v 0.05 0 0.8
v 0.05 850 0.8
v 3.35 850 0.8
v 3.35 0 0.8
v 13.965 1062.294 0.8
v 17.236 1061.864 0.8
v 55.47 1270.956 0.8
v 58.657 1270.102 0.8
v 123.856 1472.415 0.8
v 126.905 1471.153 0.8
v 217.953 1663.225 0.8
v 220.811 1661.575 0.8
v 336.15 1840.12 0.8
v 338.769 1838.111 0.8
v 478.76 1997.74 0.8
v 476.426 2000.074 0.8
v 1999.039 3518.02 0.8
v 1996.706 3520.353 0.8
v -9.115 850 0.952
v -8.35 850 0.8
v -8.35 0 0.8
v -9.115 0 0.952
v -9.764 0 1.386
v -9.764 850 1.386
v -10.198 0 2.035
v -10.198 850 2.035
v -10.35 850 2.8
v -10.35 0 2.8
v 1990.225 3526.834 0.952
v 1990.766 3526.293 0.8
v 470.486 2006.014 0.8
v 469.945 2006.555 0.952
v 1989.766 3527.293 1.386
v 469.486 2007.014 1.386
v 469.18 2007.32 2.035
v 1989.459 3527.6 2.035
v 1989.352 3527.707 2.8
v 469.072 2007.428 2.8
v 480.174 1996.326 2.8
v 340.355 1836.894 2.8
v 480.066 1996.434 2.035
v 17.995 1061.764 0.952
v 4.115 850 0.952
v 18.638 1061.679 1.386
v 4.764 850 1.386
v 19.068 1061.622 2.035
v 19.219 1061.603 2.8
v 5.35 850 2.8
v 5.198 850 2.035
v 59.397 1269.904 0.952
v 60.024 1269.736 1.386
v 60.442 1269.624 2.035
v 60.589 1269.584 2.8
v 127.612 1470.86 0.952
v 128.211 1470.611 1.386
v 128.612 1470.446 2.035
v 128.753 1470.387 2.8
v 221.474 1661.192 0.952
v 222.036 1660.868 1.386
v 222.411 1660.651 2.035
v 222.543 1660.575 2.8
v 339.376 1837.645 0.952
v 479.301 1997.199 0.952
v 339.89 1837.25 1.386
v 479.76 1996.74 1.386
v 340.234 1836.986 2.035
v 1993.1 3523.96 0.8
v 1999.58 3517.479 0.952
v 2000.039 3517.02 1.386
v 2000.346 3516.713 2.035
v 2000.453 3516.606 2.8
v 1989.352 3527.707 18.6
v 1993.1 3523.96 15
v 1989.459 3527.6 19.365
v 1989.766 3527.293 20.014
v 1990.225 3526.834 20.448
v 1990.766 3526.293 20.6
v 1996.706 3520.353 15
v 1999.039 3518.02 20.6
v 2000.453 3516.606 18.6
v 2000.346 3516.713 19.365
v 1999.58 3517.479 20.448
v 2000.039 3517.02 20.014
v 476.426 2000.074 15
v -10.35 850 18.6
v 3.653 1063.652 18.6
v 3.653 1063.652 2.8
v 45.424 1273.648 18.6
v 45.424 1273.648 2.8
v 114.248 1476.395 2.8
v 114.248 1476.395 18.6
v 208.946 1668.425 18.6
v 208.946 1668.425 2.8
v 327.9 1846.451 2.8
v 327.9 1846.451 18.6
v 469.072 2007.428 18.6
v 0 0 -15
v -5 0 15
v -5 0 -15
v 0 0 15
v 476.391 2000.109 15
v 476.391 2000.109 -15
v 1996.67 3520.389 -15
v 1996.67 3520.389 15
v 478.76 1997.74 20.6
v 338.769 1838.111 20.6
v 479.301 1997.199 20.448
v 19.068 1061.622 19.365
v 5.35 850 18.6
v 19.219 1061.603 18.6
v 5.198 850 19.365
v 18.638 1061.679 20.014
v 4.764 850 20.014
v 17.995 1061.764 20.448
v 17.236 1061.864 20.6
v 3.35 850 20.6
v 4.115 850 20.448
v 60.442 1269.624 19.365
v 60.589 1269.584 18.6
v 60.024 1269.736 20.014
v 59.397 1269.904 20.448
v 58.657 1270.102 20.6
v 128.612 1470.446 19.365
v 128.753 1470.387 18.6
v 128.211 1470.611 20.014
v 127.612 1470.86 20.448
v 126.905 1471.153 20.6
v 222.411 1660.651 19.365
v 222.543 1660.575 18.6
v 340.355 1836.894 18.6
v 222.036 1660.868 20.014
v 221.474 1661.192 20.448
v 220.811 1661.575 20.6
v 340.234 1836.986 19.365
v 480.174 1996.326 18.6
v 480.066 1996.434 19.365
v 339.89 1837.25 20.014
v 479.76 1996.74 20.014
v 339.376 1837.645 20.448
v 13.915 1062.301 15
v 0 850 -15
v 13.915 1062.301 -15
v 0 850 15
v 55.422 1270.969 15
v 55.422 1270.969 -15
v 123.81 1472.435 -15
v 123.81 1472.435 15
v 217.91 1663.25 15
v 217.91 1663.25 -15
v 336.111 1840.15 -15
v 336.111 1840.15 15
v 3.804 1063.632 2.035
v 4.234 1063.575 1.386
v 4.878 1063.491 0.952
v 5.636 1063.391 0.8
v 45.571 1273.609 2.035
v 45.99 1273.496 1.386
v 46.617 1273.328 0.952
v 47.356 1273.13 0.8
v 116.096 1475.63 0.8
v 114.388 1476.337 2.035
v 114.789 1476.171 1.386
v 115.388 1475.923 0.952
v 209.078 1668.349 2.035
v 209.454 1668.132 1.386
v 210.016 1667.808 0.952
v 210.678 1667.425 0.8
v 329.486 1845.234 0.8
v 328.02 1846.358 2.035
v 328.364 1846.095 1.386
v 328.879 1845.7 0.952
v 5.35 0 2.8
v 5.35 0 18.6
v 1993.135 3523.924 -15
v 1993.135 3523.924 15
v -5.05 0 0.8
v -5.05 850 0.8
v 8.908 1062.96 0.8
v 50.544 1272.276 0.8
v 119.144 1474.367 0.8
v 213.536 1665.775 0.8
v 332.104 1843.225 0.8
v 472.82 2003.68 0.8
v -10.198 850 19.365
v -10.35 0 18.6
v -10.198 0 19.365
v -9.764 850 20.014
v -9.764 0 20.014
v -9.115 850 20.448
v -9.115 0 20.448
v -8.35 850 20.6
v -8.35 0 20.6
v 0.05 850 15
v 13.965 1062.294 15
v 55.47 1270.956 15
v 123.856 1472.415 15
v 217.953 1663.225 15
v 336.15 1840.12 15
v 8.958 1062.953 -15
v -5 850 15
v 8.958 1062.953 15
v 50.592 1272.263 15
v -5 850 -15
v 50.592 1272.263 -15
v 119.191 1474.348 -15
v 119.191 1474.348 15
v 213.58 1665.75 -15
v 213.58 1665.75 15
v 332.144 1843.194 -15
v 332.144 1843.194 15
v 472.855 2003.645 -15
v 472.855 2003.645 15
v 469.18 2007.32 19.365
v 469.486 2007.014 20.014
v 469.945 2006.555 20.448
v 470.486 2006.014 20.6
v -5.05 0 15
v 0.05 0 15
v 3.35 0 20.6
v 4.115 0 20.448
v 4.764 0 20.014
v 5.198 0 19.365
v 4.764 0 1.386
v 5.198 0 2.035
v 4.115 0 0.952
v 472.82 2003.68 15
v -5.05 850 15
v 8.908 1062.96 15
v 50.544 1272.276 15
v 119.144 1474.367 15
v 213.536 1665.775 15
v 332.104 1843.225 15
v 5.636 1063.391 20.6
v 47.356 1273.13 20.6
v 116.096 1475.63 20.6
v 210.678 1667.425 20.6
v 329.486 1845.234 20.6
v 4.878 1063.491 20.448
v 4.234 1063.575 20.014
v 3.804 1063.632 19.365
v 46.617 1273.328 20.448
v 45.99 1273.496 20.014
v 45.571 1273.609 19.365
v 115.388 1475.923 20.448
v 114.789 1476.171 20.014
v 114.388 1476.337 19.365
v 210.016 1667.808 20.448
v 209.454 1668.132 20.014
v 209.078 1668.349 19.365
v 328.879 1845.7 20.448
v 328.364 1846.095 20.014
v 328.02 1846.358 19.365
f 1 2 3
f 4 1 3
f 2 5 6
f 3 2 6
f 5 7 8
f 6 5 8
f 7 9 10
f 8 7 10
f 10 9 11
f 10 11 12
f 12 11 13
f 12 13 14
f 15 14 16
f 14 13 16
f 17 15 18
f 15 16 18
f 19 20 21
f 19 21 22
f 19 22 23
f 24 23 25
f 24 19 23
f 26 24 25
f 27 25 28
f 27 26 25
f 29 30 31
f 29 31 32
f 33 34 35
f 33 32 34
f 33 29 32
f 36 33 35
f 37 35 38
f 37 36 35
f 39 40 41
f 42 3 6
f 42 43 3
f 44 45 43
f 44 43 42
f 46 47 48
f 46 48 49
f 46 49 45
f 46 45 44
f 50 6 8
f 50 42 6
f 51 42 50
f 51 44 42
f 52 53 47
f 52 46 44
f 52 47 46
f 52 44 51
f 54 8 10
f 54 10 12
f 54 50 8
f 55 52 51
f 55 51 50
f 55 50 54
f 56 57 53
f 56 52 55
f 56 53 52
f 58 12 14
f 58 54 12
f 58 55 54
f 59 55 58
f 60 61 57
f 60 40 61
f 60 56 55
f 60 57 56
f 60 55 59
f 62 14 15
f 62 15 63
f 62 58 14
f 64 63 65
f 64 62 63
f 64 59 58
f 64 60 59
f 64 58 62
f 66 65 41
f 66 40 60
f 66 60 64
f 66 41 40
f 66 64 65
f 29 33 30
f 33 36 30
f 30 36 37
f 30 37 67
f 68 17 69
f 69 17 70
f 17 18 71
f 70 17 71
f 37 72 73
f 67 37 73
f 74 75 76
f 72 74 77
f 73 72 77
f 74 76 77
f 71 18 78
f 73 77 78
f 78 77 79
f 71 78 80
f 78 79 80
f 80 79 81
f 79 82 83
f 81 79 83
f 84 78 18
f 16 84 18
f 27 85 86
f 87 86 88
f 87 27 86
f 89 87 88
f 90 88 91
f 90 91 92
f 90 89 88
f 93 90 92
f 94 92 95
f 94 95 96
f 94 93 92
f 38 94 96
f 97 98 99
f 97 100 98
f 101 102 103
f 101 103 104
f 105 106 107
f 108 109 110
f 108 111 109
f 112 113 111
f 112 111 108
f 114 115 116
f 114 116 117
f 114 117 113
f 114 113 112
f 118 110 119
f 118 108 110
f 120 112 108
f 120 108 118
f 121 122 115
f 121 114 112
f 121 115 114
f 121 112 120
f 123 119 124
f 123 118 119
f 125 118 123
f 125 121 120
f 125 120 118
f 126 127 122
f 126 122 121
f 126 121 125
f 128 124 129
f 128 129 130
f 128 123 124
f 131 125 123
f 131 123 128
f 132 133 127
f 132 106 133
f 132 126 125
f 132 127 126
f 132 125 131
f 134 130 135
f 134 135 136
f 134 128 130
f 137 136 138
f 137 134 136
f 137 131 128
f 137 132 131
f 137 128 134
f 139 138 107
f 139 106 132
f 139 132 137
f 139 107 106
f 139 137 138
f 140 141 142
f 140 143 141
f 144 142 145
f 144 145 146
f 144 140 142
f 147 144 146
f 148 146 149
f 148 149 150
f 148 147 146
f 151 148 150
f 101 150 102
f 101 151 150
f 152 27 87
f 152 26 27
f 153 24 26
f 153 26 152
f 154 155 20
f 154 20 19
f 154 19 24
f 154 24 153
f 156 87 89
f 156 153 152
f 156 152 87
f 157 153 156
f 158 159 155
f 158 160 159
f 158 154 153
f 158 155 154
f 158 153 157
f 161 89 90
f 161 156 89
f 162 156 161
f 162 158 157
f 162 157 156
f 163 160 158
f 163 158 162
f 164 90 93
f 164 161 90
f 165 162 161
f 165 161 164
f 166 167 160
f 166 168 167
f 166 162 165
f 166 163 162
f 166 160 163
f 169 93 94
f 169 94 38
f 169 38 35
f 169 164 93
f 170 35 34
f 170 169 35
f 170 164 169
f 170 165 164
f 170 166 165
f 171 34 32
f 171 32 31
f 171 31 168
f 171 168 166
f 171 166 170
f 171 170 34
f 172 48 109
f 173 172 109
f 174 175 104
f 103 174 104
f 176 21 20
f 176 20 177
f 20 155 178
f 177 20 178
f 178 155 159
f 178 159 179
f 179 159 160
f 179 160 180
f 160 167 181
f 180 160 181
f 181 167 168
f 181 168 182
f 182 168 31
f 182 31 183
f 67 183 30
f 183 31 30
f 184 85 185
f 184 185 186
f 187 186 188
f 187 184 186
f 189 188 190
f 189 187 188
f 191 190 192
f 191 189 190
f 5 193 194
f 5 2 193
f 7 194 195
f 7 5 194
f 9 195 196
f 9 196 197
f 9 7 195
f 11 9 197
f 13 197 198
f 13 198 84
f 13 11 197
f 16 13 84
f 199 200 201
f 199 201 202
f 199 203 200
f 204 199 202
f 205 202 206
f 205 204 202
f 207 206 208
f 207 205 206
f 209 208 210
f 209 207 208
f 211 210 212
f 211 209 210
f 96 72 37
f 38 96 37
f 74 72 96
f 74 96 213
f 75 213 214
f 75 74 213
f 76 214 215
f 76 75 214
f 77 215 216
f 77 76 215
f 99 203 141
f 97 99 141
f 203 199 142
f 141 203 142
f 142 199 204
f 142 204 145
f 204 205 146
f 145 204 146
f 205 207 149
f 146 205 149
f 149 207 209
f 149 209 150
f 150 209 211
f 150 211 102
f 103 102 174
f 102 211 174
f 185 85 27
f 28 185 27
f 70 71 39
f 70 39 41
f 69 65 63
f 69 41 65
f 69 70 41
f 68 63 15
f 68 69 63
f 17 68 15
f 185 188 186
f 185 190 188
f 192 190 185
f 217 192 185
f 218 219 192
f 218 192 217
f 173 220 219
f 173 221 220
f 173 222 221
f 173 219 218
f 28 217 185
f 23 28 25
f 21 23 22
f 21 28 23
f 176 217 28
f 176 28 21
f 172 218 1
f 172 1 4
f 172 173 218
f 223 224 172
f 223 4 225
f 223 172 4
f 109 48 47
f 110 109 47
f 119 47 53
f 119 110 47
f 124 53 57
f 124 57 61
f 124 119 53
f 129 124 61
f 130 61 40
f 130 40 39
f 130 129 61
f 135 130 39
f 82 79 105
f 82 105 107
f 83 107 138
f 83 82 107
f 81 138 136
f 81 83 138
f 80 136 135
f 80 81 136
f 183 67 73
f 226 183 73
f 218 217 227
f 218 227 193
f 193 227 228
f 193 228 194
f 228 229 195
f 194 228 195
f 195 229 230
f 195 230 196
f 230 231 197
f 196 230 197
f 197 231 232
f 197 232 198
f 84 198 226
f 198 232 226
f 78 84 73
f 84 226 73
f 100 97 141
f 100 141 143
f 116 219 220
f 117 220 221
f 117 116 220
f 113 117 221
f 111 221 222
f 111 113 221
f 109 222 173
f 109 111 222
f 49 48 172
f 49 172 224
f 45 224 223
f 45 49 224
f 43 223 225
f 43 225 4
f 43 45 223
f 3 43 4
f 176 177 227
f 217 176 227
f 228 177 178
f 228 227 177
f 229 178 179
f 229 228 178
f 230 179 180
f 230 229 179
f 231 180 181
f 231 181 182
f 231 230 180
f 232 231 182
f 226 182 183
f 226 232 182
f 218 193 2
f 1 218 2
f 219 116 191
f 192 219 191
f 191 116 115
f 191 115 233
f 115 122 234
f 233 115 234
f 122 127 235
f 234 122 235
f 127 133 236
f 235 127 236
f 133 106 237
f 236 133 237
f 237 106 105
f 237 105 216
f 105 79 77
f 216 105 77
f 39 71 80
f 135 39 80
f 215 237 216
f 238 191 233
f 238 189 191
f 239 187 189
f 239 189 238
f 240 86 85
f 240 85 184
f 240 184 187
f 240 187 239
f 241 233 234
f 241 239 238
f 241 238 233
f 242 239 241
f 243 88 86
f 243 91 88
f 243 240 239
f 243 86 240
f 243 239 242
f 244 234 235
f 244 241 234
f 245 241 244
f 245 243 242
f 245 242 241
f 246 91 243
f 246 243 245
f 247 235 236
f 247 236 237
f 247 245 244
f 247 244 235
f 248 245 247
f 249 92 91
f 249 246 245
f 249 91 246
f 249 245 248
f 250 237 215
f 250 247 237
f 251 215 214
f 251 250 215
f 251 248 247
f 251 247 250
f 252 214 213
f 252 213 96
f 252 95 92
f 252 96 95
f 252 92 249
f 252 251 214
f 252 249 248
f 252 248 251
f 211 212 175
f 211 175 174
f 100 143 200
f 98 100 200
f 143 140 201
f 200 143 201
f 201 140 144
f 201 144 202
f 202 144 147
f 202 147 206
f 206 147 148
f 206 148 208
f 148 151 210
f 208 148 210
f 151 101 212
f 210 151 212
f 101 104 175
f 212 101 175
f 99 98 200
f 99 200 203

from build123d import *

# Parameters (mm, degrees)
F1_W = 5
F1_H = 30


with BuildPart() as f2:
    # F2: sweep along a path in F0
    with BuildLine(Plane.XY) as f2_path:
        Line((0, 0), (0, 850))
        ThreePointArc((0, 850), (123.8099403704, 1472.4346027418), (476.3908204001, 2000.1091795999))
        Line((476.3908204001, 2000.1091795999), (1996.6703999512, 3520.388759151))
    # F1 (on Front) → F2 (sweep)
    with BuildSketch(Plane.XZ):
        with Locations((-2.5, 0)):
            Rectangle(F1_W, F1_H)
    sweep(path=f2_path.line)


with BuildPart() as f4:
    # F4: sweep along a path in F4_path
    with BuildLine(Plane(origin=(0, 0, 15), x_dir=(-1, 0, 0), z_dir=(0, 0, 1))) as f4_path:
        Line((0, 0), (0, -850))
        ThreePointArc((0, -850), (-123.8099403704, -1472.4346027418), (-476.3908204001, -2000.1091795999))
        Line((-476.3908204001, -2000.1091795999), (-1996.6703999513, -3520.3887591509))
    # F3 (on face) → F4 (sweep)
    with BuildSketch(Plane.XZ):
        with BuildLine():
            Line((-10.35, 18.6), (-10.35, 2.8))
            ThreePointArc((-10.35, 2.8), (-9.7642135624, 1.3857864376), (-8.35, 0.8))
            Line((-8.35, 0.8), (-5.05, 0.8))
            Line((-5.05, 0.8), (-5.05, 15))
            Line((-5.05, 15), (0.05, 15))
            Line((0.05, 15), (0.05, 0.8))
            Line((0.05, 0.8), (3.35, 0.8))
            ThreePointArc((3.35, 0.8), (4.7642135624, 1.3857864376), (5.35, 2.8))
            Line((5.35, 2.8), (5.35, 18.6))
            ThreePointArc((5.35, 18.6), (4.7642135624, 20.0142135624), (3.35, 20.6))
            Line((3.35, 20.6), (-8.35, 20.6))
            ThreePointArc((-8.35, 20.6), (-9.7642135624, 20.0142135624), (-10.35, 18.6))
        make_face()
    sweep(path=f4_path.line)


solid = Compound([f2.part, f4.part])
